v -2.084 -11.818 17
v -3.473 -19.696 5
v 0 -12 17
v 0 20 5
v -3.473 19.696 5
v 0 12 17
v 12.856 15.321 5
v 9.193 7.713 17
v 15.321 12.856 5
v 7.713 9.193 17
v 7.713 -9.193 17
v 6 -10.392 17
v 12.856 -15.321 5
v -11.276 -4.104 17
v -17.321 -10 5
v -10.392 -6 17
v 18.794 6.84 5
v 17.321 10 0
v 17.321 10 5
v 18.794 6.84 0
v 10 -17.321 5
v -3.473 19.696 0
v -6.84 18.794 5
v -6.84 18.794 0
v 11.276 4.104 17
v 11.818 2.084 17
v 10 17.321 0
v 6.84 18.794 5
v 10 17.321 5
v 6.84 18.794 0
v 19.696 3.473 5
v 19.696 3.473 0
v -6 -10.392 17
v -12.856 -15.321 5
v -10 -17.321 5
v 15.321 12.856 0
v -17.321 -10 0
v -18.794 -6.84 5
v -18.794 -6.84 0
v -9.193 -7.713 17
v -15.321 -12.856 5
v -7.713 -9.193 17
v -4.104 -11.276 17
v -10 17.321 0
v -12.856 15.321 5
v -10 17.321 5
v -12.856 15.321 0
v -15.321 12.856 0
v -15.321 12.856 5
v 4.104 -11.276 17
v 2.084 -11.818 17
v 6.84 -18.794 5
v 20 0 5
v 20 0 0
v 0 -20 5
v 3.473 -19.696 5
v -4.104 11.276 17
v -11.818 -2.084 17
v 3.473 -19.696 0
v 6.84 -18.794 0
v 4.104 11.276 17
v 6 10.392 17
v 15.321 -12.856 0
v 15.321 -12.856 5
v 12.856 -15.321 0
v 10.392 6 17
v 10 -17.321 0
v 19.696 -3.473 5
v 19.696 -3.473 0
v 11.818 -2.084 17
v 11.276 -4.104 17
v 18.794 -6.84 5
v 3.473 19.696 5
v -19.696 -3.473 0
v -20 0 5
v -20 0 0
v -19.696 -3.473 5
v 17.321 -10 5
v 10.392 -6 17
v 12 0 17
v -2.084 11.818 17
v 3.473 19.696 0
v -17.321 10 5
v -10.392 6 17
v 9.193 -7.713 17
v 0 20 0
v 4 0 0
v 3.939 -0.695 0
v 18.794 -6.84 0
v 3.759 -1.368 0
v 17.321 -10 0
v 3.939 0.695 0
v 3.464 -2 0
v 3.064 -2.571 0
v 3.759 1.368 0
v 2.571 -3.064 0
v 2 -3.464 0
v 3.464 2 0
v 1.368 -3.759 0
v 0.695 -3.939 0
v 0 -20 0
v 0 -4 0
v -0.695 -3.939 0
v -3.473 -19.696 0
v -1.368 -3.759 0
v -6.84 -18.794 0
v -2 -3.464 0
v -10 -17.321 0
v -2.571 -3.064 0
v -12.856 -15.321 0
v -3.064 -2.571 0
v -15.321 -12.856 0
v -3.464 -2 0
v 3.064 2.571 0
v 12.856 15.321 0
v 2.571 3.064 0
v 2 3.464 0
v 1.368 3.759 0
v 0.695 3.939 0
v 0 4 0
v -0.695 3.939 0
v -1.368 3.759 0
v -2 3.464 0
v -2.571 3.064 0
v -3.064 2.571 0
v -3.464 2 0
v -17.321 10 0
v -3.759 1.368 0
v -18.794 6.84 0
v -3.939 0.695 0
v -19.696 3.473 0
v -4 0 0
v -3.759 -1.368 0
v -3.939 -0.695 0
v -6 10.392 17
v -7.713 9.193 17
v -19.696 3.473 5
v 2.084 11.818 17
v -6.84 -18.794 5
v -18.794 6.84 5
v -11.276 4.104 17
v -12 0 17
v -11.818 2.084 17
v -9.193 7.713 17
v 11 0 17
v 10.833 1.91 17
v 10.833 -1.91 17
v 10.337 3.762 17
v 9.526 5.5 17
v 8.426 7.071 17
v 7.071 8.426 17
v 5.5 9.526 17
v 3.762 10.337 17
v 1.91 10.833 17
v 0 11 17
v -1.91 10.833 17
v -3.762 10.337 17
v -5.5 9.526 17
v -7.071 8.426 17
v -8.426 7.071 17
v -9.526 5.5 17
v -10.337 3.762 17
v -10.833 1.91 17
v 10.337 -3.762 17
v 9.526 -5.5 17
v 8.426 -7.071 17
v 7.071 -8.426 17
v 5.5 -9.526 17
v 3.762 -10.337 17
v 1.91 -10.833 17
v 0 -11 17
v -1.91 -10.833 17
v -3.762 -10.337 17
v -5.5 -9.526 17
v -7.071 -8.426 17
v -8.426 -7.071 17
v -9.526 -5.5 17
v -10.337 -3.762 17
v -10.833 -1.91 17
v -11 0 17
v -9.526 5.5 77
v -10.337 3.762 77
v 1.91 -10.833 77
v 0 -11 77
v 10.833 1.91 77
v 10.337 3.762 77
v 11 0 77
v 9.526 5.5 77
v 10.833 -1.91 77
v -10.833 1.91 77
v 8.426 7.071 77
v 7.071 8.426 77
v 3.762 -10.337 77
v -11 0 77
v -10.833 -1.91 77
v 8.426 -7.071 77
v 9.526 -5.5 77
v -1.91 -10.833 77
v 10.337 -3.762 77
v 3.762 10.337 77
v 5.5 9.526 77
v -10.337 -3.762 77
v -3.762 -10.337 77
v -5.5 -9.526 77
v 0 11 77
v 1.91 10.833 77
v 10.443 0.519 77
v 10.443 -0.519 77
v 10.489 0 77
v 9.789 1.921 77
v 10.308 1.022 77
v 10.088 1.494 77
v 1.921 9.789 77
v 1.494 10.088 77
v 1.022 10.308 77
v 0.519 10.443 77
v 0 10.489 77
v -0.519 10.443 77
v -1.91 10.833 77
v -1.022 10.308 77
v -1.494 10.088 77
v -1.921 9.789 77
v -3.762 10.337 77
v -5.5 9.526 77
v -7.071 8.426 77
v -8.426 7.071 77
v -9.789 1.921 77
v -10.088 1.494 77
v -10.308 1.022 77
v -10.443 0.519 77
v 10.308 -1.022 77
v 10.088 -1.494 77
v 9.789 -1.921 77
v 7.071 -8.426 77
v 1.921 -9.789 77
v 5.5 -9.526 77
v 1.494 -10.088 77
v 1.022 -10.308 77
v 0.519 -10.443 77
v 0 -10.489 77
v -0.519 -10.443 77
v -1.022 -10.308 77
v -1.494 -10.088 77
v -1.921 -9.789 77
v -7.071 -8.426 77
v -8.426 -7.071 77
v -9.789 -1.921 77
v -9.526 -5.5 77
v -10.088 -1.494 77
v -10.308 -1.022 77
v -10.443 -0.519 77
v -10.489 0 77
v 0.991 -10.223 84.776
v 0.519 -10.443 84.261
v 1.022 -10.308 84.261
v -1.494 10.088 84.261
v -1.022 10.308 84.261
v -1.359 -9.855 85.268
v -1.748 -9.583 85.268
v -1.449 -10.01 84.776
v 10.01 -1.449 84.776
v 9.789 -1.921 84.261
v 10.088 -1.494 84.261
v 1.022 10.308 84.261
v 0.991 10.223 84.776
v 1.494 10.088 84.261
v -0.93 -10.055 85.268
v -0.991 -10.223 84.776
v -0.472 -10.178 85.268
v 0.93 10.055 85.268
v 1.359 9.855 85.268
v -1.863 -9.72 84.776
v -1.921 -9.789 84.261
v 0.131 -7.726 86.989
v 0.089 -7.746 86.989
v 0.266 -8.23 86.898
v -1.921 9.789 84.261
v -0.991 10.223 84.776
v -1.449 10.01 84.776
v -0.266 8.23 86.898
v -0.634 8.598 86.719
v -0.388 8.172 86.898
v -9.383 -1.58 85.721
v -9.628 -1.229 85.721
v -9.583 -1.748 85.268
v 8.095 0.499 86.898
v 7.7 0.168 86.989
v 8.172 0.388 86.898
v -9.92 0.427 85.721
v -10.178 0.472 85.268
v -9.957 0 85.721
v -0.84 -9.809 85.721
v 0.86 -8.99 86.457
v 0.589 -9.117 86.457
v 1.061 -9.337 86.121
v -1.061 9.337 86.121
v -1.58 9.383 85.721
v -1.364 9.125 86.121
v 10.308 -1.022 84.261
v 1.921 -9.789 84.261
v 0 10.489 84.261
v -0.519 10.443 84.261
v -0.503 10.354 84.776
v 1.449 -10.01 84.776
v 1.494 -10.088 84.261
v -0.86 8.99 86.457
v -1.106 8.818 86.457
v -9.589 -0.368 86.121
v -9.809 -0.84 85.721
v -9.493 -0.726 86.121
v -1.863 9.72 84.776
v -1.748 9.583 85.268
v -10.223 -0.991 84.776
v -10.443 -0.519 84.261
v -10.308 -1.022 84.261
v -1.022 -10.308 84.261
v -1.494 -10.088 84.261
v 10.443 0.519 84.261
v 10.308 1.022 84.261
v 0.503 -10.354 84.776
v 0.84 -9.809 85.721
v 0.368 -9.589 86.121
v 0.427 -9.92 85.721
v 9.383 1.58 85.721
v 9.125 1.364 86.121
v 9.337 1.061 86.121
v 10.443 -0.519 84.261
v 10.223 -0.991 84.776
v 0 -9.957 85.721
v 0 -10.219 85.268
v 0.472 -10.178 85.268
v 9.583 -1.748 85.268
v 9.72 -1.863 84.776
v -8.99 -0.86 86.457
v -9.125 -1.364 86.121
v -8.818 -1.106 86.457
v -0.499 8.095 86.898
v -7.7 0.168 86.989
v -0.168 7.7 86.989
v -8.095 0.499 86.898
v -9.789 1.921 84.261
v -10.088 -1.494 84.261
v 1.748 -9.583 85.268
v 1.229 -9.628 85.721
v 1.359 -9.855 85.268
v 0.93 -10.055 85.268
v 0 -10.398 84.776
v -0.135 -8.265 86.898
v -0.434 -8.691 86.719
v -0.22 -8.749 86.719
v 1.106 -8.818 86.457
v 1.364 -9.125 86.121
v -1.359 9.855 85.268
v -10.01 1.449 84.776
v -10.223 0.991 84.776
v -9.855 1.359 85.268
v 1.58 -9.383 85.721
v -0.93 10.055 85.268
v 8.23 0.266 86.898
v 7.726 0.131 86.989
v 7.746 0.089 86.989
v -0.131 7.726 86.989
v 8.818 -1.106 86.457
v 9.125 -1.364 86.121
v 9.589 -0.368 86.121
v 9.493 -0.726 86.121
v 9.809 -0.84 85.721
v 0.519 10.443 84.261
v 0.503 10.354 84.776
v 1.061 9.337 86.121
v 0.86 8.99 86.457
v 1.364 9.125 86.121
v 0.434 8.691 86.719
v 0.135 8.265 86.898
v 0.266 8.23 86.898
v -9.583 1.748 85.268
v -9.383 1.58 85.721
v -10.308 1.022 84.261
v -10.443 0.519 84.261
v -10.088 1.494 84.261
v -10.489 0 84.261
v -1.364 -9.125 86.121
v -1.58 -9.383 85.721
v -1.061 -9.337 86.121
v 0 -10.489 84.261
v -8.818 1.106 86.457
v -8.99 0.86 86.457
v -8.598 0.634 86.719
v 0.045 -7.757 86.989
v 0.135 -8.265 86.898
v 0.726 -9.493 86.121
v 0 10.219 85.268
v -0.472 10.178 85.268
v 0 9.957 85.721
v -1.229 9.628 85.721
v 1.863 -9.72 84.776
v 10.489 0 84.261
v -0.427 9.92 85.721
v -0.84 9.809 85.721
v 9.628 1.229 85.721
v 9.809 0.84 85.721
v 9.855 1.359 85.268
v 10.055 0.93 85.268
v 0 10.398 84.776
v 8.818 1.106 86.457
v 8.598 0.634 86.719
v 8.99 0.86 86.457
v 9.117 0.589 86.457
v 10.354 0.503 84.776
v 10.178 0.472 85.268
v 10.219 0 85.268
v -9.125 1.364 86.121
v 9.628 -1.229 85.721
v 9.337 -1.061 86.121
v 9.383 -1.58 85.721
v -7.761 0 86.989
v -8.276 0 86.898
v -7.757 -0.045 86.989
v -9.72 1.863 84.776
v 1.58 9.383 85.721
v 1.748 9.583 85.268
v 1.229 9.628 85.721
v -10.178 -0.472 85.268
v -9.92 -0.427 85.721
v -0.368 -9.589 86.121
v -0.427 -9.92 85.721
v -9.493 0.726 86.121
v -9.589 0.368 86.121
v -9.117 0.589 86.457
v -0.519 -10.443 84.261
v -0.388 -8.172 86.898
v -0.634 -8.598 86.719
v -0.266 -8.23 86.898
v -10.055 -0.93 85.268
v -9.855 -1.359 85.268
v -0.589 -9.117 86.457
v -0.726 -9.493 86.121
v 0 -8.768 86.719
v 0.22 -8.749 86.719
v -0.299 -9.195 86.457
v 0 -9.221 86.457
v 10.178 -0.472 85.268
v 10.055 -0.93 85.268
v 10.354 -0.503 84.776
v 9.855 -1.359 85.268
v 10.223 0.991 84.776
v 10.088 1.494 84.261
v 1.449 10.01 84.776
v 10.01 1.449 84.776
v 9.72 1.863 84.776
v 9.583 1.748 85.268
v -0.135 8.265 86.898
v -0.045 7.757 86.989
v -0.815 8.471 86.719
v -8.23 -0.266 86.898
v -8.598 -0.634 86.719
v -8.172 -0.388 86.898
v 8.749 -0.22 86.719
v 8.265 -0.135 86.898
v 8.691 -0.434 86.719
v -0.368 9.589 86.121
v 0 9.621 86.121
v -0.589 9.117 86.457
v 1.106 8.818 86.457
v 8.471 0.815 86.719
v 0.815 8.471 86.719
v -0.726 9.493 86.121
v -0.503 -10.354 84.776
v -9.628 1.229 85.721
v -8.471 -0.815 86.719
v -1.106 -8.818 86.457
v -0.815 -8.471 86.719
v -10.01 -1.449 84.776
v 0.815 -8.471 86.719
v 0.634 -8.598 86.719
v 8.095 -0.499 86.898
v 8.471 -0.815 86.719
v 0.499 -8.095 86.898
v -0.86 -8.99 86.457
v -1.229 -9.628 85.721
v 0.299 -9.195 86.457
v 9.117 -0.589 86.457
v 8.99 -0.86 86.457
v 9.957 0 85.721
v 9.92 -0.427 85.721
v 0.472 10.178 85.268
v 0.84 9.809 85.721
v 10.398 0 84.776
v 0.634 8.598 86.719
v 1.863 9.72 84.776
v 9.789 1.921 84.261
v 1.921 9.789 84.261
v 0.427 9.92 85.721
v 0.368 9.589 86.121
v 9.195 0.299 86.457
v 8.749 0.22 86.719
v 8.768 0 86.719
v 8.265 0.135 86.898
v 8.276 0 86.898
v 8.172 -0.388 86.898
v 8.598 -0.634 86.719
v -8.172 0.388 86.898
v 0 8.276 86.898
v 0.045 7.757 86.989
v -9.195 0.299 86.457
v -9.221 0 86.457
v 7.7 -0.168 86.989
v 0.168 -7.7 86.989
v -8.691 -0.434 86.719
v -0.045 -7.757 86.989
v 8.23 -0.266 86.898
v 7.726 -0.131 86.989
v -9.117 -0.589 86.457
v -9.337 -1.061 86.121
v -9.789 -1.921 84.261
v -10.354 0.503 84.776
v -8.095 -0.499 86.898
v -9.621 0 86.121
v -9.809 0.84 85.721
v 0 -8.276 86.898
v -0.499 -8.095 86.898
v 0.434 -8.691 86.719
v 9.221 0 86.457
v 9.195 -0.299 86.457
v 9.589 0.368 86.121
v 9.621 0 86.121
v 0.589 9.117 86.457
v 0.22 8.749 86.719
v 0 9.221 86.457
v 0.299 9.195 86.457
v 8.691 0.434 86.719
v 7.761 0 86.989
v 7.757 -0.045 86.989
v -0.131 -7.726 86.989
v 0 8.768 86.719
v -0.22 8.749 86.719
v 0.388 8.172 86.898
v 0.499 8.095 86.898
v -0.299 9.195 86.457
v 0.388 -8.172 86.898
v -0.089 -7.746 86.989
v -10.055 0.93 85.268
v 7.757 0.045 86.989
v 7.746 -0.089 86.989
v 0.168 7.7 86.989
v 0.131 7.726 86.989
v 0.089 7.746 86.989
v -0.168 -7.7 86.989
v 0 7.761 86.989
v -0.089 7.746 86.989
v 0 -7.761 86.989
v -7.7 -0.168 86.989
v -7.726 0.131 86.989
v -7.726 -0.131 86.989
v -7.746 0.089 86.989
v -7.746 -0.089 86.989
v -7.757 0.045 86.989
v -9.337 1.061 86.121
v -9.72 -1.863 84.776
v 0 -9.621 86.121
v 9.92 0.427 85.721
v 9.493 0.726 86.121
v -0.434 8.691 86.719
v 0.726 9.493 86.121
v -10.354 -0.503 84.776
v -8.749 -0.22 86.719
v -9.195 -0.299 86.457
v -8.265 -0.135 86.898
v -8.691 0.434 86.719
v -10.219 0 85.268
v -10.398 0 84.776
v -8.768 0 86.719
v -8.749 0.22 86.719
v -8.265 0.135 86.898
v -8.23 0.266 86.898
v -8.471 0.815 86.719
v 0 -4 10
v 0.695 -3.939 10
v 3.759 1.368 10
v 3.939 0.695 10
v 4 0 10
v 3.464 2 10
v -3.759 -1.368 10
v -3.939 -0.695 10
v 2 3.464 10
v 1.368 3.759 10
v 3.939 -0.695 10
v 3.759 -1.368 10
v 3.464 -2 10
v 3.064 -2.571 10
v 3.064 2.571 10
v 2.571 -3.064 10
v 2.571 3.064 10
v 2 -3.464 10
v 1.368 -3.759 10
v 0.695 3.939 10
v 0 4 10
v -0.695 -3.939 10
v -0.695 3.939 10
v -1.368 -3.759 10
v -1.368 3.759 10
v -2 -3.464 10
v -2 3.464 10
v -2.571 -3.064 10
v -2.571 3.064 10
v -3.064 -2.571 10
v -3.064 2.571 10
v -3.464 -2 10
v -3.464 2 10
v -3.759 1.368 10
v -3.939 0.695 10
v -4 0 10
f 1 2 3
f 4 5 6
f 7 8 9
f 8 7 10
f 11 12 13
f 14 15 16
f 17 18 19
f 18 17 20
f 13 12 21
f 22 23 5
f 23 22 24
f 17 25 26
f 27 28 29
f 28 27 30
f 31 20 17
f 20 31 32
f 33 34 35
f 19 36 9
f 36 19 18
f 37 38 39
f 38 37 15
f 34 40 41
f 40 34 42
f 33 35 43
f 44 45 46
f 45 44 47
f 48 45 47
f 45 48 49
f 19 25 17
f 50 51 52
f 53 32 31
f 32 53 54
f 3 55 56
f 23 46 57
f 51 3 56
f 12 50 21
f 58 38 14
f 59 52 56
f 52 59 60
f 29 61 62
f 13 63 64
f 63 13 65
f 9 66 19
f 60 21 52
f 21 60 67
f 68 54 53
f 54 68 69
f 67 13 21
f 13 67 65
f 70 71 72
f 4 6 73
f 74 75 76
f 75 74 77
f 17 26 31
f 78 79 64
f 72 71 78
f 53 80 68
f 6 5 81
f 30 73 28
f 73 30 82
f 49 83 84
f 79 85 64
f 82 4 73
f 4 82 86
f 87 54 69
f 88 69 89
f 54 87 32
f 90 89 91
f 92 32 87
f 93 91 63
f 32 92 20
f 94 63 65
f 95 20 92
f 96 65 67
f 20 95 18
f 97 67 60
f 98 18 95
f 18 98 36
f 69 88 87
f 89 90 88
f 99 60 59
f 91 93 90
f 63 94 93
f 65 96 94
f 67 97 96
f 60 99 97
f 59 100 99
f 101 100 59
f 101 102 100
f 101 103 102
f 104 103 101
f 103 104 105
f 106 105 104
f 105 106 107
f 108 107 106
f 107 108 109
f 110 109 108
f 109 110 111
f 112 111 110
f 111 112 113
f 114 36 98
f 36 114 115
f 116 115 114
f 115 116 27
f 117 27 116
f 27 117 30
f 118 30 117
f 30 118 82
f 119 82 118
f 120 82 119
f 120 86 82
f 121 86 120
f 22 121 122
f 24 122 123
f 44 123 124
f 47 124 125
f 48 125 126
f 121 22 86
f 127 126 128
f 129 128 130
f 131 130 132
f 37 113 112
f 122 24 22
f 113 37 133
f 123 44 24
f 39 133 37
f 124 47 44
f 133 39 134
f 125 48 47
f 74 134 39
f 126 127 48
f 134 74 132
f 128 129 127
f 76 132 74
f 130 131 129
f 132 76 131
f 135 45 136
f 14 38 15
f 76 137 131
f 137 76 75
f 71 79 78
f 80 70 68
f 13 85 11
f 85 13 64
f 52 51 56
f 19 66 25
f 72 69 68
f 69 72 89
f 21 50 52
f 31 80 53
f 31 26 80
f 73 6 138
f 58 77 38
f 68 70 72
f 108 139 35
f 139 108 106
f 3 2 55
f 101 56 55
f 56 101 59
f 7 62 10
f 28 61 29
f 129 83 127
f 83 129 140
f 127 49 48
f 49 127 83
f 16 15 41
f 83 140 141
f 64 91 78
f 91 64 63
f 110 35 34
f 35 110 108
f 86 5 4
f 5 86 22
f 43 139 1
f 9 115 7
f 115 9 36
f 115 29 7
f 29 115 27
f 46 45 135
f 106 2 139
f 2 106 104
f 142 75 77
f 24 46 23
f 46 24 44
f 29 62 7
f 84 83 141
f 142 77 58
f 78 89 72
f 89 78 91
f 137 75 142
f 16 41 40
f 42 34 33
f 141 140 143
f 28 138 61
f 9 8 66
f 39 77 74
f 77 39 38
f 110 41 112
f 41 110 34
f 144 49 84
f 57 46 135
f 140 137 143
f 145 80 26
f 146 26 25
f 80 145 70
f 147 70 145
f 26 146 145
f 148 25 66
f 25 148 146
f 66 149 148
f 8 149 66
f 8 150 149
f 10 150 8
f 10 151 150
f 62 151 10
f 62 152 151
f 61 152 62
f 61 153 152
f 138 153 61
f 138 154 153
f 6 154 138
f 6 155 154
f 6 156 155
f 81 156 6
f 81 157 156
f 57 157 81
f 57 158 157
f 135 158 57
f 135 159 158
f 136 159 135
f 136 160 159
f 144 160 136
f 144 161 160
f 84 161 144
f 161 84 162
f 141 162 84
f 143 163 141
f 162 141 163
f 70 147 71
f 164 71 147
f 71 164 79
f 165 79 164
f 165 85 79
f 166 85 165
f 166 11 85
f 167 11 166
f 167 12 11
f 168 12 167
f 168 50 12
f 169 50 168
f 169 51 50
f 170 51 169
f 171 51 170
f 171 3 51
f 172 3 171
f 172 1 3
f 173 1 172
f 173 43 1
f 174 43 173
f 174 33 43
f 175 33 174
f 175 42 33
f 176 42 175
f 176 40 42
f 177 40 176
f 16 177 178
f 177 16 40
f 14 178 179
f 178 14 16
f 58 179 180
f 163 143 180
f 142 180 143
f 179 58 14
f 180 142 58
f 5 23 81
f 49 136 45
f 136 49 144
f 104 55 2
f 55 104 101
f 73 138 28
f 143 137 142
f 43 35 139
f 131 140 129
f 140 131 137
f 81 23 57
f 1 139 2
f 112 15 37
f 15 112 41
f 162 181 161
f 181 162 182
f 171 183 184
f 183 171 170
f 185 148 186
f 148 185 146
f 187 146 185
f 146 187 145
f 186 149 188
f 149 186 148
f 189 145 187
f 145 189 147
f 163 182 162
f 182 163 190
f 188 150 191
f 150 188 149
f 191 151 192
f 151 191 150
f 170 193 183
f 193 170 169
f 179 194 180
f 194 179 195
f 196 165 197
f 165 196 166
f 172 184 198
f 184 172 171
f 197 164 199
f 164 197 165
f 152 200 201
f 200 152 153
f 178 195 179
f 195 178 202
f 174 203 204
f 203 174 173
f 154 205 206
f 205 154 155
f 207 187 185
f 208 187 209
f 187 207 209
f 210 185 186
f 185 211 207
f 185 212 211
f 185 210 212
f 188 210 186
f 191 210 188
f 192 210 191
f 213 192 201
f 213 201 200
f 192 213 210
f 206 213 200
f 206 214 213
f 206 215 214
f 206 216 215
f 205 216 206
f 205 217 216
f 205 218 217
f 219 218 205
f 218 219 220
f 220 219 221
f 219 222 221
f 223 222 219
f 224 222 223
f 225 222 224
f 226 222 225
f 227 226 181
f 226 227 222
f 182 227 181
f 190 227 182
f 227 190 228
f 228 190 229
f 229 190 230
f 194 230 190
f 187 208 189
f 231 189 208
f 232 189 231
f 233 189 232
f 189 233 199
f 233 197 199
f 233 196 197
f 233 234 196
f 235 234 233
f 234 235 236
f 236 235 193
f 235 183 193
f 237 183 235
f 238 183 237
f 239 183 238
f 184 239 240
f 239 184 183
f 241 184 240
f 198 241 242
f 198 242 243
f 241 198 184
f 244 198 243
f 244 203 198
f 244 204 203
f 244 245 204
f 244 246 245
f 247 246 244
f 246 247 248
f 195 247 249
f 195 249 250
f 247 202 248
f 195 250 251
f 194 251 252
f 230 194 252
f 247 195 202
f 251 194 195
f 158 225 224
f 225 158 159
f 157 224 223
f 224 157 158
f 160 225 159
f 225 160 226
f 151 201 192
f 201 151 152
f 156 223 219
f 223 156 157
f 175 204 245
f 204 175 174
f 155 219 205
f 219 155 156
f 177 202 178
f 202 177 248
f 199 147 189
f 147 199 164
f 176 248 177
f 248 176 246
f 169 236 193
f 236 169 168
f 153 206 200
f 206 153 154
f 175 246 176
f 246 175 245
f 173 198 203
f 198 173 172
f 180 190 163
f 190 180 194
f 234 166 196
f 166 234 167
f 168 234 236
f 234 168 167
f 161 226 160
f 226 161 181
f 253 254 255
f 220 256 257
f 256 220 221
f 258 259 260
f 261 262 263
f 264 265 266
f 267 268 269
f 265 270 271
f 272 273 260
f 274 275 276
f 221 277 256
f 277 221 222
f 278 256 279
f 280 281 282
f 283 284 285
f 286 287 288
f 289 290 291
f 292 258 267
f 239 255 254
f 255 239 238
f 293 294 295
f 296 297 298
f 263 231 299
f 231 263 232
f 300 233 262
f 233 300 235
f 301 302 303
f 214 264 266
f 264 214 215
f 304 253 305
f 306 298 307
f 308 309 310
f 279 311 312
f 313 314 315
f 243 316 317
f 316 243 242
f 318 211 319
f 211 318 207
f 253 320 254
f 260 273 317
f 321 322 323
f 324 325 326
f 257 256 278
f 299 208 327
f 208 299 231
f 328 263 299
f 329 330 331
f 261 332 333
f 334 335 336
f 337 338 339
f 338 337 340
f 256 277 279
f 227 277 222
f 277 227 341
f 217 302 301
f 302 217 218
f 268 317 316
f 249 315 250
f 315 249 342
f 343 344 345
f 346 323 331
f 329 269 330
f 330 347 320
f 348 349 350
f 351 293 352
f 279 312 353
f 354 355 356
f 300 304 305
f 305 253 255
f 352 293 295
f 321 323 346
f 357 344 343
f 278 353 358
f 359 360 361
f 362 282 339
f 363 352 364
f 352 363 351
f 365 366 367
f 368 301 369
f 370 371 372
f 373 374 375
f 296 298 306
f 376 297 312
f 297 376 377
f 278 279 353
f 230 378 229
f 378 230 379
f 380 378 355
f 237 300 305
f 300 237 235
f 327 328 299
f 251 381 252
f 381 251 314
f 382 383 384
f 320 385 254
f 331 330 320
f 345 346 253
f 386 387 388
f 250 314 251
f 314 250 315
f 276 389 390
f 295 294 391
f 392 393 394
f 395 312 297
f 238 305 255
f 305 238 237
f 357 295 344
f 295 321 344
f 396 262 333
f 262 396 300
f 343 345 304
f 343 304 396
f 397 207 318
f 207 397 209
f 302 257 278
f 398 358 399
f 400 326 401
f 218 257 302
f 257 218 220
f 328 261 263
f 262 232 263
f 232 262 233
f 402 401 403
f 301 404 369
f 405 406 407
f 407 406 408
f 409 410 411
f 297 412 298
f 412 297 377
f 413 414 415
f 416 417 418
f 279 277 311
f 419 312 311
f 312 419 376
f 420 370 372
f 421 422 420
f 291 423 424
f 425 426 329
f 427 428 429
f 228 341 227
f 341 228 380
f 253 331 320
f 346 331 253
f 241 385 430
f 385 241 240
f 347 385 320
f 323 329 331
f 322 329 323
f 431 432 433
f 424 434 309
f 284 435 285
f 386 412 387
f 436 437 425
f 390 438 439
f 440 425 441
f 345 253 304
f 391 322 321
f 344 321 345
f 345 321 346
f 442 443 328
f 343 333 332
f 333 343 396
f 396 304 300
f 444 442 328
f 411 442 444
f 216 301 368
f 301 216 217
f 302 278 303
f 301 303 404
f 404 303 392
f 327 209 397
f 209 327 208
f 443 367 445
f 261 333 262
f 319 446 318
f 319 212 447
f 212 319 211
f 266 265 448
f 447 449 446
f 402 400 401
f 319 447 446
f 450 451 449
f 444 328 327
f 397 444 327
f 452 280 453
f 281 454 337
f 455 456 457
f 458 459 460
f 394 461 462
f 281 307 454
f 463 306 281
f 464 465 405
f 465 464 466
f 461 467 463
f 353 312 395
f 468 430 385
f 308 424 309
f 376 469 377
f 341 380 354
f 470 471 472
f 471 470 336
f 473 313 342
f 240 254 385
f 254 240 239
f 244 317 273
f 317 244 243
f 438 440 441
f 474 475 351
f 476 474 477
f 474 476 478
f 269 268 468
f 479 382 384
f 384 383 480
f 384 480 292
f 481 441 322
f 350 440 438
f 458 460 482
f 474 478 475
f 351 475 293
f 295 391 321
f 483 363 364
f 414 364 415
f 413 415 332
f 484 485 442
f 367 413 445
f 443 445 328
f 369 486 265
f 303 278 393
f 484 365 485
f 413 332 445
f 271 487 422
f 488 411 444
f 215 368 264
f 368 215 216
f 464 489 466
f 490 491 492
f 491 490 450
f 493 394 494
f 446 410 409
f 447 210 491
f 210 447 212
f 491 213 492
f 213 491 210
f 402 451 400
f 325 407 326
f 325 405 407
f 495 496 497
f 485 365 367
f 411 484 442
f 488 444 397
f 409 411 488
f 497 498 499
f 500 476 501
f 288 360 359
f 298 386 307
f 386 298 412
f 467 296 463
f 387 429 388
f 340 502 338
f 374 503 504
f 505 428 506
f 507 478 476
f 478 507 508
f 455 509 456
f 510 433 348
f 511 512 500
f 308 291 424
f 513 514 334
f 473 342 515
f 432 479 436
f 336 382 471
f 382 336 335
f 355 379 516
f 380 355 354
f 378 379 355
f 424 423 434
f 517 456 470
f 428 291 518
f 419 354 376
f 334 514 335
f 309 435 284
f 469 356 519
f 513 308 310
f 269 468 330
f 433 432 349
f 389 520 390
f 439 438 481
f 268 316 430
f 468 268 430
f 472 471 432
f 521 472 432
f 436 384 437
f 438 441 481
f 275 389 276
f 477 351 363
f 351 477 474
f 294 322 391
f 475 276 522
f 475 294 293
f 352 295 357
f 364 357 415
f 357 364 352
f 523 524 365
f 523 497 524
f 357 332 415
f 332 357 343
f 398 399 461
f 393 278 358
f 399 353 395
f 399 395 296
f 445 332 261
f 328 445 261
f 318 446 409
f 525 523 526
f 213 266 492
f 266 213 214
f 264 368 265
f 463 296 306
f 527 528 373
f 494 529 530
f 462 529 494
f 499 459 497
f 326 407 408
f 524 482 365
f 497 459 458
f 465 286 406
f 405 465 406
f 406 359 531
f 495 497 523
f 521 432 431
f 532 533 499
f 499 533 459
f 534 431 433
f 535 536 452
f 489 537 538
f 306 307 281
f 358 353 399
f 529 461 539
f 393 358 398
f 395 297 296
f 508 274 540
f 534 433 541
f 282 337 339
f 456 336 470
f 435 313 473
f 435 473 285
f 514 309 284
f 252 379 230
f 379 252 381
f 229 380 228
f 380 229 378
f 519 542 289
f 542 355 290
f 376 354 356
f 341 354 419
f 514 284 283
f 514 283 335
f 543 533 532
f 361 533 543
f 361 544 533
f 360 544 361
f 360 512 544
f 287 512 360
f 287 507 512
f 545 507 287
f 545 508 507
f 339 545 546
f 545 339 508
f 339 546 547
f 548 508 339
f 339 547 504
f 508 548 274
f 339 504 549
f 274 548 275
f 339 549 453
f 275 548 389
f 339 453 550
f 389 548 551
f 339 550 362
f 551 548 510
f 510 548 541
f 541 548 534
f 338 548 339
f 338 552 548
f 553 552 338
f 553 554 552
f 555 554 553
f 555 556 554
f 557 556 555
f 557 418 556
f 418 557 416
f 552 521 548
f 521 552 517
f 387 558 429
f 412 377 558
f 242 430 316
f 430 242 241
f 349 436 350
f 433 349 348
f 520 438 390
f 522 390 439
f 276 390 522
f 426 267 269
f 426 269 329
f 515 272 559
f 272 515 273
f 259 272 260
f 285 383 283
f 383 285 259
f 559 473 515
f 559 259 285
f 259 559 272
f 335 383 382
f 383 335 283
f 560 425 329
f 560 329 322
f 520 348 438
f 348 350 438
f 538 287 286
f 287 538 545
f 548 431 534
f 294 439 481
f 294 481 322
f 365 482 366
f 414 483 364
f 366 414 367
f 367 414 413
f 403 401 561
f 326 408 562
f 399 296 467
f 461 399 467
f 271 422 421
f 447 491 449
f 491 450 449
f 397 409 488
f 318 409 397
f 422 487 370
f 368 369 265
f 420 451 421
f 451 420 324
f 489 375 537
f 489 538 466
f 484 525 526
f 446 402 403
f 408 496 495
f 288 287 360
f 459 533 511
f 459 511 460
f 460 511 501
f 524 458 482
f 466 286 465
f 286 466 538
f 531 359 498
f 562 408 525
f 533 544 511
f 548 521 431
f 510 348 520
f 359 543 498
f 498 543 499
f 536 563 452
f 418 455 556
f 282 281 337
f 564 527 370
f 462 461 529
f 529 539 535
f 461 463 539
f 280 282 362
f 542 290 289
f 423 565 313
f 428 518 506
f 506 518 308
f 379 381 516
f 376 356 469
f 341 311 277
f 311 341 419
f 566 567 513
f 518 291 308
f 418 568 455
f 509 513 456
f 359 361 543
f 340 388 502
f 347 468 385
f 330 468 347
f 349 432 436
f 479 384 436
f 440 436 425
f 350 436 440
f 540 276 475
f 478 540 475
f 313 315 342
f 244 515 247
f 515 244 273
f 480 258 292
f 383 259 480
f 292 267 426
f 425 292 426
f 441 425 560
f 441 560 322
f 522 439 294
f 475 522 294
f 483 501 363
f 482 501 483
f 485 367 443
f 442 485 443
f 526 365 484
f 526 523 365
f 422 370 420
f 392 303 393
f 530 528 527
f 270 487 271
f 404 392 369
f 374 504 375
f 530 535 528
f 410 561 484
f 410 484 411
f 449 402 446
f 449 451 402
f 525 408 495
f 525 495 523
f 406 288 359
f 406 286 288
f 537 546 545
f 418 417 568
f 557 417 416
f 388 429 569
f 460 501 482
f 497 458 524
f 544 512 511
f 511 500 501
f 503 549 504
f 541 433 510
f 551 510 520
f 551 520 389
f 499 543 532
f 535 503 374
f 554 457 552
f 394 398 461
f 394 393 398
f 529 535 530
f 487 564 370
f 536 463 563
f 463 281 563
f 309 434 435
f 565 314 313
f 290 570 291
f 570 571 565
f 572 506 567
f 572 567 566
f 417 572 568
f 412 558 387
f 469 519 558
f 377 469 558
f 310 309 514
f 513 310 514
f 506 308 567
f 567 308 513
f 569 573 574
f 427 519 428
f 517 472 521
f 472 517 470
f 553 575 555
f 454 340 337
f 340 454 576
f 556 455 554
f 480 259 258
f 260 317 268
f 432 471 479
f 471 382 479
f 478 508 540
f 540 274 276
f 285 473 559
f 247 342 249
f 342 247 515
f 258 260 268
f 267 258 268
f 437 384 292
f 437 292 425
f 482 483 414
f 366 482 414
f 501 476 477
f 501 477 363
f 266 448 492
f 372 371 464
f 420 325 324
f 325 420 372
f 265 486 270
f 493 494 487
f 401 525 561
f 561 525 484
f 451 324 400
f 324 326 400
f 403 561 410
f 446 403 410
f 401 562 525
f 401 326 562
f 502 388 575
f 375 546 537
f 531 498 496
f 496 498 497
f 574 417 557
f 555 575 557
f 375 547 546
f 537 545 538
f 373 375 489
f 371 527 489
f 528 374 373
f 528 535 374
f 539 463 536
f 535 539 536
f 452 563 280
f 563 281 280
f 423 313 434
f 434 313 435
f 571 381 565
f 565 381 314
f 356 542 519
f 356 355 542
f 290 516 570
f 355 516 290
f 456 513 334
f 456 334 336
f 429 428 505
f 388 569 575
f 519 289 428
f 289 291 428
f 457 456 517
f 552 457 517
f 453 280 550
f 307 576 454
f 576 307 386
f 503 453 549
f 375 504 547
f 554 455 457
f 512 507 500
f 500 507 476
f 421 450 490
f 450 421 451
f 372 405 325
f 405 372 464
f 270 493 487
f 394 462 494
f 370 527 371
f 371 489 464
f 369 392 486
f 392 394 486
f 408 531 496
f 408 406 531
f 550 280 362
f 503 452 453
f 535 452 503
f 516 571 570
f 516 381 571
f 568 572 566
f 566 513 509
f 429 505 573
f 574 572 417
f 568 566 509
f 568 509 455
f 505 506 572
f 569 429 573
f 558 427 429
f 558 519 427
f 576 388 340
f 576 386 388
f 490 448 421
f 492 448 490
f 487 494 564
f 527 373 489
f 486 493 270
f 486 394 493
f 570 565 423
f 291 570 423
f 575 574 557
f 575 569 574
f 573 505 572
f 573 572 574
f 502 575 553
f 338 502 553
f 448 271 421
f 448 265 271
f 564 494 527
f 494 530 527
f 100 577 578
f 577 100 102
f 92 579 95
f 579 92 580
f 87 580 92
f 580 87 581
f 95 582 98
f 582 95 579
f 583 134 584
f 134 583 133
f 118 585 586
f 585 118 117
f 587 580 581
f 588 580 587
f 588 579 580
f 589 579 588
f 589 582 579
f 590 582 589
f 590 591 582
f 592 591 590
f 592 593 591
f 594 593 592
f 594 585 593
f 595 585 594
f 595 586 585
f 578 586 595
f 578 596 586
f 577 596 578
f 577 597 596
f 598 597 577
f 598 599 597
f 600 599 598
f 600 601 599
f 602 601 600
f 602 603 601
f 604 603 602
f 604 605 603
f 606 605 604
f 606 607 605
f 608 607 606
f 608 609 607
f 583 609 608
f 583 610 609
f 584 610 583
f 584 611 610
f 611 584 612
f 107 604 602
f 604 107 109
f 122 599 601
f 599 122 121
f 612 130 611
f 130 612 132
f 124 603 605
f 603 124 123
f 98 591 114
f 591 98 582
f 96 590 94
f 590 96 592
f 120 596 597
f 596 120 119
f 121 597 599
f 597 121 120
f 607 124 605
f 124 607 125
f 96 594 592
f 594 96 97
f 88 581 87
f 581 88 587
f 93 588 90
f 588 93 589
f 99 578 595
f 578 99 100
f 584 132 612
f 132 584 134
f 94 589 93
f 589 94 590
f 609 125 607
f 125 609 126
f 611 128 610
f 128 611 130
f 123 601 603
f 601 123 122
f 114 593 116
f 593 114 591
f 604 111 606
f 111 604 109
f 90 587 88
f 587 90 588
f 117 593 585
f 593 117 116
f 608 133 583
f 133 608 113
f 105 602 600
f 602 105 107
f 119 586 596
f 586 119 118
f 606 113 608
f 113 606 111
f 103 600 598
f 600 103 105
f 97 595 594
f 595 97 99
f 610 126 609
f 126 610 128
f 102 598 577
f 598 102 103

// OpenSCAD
$fn=36;
//Dimensions of top part
Top_x=18;
Top_y=18;
Fillet=3;
h_top=10;
//Radius and height of the central body
radius_middle_top=11;
h_middle_top=60;
//Radius of the bottom middle part of the body
radius_middle_bottom=12;
h_middle_bottom=12;
//Radius of the foot
radius_bottom=20;
h_bottom=5;
//Radius hole   0 to disable - This is to fit a TPU insert to extend the foot or to have something softer in contact with the table.
radius_hole=4;
//TPU extension  0 to render foot     1 to render TPU insert
Render_insert=0;
TPU_bottom_radius=radius_bottom;
TPU_bottom_thickness=1;
TPU_insert=radius_hole;

if(Render_insert==0)
difference()
{
   union()
   {
      hull()
      {
      cylinder(r=radius_bottom,h=h_bottom);
      cylinder(r=radius_middle_bottom,h=h_bottom+h_middle_bottom);
      }
      cylinder(r=radius_middle_top,h=h_bottom+h_middle_bottom+h_middle_top);

      translate([0,0,Fillet])
      hull()
         {
         translate([-Top_x/2+Fillet/2,0,0])
          sphere(Fillet);
         translate([0,-Top_y/2+Fillet/2,0])
          sphere(Fillet);
         translate([Top_x/2-Fillet/2,0,0])
          sphere(Fillet);
         translate([0,Top_y/2-Fillet/2,0])
          sphere(Fillet);
         translate([-Top_x/2+Fillet/2,0,(h_bottom+h_middle_bottom+h_middle_top+h_top)-Fillet*2])
          sphere(Fillet);
         translate([0,-Top_y/2+Fillet/2,(h_bottom+h_middle_bottom+h_middle_top+h_top)-Fillet*2])
          sphere(Fillet);
         translate([Top_x/2-Fillet/2,0,(h_bottom+h_middle_bottom+h_middle_top+h_top)-Fillet*2])
          sphere(Fillet);
         translate([0,Top_y/2-Fillet/2,(h_bottom+h_middle_bottom+h_middle_top+h_top)-Fillet*2])
          sphere(Fillet);
         

         }
      *translate([0,0,(h_bottom+h_middle_bottom+h_middle_top+h_top)/2])
      cube([Top_x,Top_y,h_bottom+h_middle_bottom+h_middle_top+h_top],center=true);


   }

cylinder(r=radius_hole,h=10);
}

if(Render_insert==1)
{
cylinder(r=TPU_bottom_radius,h=TPU_bottom_thickness);
cylinder(r=radius_hole,h=TPU_bottom_thickness+5);
}
